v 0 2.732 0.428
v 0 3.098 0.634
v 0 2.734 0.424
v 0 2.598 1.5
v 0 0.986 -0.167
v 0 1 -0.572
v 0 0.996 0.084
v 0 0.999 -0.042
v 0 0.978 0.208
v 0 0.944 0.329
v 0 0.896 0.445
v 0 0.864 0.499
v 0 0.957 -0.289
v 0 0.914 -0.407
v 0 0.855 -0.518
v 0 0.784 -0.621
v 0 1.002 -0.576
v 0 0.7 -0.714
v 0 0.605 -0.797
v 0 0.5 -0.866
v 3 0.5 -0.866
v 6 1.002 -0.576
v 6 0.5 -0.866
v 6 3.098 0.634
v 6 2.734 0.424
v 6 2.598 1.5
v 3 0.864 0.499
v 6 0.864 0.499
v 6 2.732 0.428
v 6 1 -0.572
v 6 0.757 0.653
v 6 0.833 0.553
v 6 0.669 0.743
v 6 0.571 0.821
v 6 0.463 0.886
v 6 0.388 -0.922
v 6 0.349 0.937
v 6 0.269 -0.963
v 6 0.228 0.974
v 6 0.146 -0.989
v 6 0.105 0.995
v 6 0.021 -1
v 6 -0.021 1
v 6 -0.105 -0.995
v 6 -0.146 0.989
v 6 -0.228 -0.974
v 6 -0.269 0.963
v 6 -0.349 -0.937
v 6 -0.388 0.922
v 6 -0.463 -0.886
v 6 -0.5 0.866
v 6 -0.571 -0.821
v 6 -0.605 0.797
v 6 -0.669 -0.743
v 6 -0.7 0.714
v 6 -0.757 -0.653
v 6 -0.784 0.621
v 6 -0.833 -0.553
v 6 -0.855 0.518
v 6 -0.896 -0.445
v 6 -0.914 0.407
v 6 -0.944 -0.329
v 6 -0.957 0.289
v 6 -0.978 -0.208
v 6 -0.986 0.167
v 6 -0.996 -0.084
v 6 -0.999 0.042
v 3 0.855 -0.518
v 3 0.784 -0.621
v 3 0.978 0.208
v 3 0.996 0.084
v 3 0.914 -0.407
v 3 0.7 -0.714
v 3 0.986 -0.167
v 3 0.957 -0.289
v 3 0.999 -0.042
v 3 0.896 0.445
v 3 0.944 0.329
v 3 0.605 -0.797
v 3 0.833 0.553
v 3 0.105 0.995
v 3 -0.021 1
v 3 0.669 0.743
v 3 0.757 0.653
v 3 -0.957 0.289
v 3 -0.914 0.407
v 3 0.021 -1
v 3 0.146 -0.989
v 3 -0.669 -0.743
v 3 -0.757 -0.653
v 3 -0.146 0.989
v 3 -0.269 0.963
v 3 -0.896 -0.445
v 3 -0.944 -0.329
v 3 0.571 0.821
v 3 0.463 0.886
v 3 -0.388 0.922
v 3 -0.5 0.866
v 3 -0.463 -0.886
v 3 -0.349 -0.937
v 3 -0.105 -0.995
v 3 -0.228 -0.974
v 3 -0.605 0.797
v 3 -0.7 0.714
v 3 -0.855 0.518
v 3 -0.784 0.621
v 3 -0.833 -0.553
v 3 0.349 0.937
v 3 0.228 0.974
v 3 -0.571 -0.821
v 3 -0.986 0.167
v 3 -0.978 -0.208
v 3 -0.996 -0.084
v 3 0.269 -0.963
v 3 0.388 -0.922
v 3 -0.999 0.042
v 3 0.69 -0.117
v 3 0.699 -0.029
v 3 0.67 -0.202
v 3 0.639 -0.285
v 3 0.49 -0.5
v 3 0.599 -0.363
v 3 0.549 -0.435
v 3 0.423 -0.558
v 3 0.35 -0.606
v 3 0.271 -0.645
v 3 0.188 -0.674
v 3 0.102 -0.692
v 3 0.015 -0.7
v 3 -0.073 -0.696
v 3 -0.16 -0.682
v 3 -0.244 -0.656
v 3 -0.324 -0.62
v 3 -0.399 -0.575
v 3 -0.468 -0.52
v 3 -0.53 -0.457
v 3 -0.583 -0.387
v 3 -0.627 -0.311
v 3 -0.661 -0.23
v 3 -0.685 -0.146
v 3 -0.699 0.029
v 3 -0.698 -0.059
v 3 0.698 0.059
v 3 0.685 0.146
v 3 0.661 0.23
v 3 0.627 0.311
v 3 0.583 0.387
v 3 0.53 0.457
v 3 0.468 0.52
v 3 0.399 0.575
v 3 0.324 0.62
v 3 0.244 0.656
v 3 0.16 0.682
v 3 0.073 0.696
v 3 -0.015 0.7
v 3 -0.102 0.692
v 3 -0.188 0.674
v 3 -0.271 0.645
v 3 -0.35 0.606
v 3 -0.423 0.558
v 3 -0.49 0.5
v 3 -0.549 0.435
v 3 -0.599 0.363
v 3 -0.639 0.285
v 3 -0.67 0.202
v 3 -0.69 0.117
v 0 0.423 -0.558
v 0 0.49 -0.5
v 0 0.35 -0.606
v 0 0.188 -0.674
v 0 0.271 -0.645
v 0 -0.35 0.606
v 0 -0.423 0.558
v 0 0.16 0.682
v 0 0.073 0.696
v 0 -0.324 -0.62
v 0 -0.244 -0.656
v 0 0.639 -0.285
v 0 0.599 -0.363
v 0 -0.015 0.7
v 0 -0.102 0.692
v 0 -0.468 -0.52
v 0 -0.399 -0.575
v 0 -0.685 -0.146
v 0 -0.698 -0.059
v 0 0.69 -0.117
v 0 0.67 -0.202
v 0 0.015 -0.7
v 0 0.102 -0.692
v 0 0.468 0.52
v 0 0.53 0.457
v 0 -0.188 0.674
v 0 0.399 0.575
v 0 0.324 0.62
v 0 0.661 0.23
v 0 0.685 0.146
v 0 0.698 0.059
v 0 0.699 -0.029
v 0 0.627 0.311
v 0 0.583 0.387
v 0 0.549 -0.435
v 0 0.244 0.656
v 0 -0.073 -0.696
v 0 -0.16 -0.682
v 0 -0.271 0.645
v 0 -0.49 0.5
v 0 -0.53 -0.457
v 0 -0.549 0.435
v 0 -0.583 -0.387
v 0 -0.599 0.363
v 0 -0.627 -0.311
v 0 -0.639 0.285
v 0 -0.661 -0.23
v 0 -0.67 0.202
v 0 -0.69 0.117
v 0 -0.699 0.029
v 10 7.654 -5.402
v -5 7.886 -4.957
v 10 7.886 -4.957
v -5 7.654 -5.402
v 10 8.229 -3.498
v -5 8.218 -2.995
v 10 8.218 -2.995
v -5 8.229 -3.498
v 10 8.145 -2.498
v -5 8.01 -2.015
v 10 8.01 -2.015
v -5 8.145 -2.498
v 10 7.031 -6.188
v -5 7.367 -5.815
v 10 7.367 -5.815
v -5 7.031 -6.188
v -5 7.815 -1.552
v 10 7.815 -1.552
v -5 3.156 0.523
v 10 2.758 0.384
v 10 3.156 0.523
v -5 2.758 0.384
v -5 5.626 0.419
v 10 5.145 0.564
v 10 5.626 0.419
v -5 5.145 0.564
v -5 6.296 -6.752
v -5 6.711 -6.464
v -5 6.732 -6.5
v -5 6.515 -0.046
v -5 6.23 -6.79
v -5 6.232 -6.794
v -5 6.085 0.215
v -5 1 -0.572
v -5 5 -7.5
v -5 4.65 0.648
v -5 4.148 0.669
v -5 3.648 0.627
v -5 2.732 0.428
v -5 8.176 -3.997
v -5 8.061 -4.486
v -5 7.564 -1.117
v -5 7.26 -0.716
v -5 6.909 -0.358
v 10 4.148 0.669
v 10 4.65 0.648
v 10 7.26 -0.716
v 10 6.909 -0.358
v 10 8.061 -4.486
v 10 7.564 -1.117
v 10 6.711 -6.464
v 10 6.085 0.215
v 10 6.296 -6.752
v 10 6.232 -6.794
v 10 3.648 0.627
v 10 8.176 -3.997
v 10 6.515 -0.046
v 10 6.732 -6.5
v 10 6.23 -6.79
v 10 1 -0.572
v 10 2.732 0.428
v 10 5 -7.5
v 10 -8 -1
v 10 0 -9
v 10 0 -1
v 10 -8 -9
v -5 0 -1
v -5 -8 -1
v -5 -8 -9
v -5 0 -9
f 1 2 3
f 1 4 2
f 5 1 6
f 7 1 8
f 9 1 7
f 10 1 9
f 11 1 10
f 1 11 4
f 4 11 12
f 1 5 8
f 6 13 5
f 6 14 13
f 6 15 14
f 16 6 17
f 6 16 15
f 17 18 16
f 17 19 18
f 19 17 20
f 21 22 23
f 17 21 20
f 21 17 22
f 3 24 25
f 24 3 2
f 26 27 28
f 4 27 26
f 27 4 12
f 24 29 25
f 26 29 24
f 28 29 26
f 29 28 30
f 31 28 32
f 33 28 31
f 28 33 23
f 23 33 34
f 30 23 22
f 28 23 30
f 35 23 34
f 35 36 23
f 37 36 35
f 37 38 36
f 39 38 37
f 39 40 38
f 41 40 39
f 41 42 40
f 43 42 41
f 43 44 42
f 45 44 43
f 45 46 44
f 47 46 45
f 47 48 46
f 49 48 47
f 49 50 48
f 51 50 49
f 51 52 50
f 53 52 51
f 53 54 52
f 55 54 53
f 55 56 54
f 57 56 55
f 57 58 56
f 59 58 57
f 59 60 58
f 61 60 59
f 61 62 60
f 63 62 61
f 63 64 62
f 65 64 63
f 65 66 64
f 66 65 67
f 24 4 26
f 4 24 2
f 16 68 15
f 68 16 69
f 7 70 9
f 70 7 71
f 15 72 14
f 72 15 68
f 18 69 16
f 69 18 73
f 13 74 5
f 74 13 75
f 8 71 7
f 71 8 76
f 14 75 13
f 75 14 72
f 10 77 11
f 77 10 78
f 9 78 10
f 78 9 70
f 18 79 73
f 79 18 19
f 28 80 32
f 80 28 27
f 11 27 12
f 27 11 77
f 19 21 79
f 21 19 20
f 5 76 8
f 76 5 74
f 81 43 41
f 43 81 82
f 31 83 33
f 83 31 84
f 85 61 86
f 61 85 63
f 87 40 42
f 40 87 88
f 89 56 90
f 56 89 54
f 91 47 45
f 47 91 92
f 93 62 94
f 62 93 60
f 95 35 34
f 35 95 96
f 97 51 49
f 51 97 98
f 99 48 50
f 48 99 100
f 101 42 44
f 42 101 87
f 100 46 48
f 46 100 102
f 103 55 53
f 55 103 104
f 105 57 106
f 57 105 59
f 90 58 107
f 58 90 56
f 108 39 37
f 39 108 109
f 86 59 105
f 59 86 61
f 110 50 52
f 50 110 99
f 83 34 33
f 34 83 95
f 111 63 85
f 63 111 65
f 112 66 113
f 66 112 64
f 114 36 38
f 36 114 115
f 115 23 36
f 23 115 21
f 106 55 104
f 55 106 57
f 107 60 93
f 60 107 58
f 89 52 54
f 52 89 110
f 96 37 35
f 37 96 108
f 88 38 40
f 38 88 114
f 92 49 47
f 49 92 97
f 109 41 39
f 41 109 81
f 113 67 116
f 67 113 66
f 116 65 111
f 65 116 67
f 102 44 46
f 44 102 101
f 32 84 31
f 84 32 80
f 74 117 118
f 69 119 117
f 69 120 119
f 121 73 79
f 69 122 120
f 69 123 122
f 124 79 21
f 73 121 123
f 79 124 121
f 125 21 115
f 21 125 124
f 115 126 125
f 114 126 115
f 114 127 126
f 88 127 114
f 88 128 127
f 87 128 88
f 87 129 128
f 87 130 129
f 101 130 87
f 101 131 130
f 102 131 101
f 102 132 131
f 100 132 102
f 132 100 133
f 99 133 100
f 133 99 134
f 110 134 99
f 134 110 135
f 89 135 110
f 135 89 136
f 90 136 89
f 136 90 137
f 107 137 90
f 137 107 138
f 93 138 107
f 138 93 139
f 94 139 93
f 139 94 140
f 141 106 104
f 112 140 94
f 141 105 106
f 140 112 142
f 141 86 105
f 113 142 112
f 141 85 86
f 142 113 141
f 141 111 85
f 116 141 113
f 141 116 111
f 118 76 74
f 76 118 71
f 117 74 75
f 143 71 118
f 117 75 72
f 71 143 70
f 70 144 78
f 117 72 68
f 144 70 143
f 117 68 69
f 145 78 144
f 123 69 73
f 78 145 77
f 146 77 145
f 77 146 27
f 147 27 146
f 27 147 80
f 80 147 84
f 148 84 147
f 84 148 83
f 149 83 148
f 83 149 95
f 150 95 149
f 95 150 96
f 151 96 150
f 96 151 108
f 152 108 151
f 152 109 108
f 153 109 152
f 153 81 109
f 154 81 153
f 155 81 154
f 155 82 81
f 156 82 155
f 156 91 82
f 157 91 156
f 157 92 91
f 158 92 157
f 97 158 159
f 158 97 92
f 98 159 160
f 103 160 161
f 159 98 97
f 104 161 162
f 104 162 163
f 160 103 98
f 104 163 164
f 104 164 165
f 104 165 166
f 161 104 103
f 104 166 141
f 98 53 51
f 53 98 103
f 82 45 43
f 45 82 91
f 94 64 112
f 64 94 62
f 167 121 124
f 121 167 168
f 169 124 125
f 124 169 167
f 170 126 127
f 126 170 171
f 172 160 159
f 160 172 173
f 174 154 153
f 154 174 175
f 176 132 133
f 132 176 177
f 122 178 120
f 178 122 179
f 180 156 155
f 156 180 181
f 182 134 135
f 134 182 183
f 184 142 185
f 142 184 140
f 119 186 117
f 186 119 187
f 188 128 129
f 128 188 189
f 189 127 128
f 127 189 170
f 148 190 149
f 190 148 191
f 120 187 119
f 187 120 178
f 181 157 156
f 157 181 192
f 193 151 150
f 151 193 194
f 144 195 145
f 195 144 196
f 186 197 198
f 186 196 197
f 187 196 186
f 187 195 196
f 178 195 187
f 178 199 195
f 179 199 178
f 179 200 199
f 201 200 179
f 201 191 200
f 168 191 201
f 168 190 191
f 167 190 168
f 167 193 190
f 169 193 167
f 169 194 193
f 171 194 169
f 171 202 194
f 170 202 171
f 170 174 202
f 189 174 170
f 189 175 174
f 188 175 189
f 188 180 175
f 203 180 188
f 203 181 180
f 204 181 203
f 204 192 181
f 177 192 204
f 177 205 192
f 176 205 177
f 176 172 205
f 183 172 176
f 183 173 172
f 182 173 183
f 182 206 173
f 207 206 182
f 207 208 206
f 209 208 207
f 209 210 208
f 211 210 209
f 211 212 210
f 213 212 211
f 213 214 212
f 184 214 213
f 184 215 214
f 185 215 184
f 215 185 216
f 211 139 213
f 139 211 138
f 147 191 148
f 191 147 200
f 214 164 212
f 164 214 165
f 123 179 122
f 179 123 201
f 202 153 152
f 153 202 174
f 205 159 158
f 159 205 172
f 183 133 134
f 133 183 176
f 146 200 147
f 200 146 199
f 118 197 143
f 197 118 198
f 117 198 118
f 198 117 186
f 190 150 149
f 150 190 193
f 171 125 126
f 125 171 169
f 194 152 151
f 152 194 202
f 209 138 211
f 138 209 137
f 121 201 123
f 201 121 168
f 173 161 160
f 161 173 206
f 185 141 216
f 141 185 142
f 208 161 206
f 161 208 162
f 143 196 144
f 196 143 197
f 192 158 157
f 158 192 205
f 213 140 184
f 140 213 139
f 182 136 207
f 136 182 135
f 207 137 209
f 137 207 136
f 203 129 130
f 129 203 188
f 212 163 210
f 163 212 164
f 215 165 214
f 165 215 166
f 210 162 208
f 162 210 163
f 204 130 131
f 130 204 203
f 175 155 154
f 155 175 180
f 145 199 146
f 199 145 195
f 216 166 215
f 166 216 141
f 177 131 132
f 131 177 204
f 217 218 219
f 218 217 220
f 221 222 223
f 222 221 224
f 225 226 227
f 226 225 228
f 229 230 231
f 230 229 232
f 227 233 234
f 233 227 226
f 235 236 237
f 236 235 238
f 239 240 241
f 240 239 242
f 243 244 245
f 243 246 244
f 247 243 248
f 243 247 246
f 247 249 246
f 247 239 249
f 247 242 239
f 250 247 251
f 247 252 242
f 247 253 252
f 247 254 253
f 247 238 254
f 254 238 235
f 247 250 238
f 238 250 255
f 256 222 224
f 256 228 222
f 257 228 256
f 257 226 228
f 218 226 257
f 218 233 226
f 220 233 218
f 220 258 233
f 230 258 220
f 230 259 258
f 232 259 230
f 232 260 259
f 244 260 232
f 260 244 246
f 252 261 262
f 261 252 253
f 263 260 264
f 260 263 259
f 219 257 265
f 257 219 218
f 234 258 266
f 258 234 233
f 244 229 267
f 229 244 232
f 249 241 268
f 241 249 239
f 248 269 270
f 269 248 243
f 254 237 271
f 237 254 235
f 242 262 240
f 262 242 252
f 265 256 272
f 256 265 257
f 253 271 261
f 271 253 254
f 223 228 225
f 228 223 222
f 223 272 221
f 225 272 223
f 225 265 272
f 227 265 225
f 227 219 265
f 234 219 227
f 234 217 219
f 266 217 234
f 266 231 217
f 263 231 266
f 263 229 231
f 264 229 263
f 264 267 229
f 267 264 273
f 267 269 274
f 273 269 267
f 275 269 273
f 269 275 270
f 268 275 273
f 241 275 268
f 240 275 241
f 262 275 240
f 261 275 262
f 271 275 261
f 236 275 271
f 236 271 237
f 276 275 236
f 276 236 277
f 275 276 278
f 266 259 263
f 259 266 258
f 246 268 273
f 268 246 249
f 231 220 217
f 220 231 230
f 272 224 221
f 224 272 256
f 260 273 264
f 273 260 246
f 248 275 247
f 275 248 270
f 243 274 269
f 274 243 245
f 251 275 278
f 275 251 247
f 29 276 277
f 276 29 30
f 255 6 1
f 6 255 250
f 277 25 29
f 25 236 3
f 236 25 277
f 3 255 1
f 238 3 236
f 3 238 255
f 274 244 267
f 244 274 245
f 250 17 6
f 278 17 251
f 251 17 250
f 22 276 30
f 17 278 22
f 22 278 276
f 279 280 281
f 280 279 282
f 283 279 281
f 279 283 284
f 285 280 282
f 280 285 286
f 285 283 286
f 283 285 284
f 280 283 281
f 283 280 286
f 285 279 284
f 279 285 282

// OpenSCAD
// file: hinge.scad
module block() { //long block
	difference(){
		cube([6,3,1]);
		
	translate([-1,0,0])
		rotate([0,270,180])
			cylinder(h=8, r=1, $fn=50);
	}
}

module cylinder_bottom(){
	difference(){
		cylinder(h=3, r=1, $fn=50);

	translate([0,0,-1])
		cylinder(h=8, r=0.8, $fn=50);
	}

	rotate([0,270,180])
	block();
}

module cylinder_top(){

	translate([0,0,3])
		cylinder(h=3, r=1, $fn=50);
	cylinder(h=6, r=0.7, $fn=50);

	translate([0, 0, 6])
		rotate([0,90,0])
			block();
}

color("blue")
cylinder_top();

% cylinder_bottom();
// main file
use <hinge.scad>;
rotate([0,90,0]){
	color("blue")
	rotate([0,0,30])
		cylinder_top();
	%cylinder_bottom();
}

module lead()
difference() { 
  cylinder(r=4, h=15, $fn=50); 
  translate([-5,0,-2]) 
	cube([10,5,20]); 
} 

//bottom box
translate([-5,-8,-9])
cube([15,8,8]);


//lead
color("red"){
	translate([-5,5,-7.5])
	rotate([30,0,0])
	cube([15,2,8]);

	//half cylinder
	rotate([270,60,90])
	translate([5,-2,-10])
	lead();
}
